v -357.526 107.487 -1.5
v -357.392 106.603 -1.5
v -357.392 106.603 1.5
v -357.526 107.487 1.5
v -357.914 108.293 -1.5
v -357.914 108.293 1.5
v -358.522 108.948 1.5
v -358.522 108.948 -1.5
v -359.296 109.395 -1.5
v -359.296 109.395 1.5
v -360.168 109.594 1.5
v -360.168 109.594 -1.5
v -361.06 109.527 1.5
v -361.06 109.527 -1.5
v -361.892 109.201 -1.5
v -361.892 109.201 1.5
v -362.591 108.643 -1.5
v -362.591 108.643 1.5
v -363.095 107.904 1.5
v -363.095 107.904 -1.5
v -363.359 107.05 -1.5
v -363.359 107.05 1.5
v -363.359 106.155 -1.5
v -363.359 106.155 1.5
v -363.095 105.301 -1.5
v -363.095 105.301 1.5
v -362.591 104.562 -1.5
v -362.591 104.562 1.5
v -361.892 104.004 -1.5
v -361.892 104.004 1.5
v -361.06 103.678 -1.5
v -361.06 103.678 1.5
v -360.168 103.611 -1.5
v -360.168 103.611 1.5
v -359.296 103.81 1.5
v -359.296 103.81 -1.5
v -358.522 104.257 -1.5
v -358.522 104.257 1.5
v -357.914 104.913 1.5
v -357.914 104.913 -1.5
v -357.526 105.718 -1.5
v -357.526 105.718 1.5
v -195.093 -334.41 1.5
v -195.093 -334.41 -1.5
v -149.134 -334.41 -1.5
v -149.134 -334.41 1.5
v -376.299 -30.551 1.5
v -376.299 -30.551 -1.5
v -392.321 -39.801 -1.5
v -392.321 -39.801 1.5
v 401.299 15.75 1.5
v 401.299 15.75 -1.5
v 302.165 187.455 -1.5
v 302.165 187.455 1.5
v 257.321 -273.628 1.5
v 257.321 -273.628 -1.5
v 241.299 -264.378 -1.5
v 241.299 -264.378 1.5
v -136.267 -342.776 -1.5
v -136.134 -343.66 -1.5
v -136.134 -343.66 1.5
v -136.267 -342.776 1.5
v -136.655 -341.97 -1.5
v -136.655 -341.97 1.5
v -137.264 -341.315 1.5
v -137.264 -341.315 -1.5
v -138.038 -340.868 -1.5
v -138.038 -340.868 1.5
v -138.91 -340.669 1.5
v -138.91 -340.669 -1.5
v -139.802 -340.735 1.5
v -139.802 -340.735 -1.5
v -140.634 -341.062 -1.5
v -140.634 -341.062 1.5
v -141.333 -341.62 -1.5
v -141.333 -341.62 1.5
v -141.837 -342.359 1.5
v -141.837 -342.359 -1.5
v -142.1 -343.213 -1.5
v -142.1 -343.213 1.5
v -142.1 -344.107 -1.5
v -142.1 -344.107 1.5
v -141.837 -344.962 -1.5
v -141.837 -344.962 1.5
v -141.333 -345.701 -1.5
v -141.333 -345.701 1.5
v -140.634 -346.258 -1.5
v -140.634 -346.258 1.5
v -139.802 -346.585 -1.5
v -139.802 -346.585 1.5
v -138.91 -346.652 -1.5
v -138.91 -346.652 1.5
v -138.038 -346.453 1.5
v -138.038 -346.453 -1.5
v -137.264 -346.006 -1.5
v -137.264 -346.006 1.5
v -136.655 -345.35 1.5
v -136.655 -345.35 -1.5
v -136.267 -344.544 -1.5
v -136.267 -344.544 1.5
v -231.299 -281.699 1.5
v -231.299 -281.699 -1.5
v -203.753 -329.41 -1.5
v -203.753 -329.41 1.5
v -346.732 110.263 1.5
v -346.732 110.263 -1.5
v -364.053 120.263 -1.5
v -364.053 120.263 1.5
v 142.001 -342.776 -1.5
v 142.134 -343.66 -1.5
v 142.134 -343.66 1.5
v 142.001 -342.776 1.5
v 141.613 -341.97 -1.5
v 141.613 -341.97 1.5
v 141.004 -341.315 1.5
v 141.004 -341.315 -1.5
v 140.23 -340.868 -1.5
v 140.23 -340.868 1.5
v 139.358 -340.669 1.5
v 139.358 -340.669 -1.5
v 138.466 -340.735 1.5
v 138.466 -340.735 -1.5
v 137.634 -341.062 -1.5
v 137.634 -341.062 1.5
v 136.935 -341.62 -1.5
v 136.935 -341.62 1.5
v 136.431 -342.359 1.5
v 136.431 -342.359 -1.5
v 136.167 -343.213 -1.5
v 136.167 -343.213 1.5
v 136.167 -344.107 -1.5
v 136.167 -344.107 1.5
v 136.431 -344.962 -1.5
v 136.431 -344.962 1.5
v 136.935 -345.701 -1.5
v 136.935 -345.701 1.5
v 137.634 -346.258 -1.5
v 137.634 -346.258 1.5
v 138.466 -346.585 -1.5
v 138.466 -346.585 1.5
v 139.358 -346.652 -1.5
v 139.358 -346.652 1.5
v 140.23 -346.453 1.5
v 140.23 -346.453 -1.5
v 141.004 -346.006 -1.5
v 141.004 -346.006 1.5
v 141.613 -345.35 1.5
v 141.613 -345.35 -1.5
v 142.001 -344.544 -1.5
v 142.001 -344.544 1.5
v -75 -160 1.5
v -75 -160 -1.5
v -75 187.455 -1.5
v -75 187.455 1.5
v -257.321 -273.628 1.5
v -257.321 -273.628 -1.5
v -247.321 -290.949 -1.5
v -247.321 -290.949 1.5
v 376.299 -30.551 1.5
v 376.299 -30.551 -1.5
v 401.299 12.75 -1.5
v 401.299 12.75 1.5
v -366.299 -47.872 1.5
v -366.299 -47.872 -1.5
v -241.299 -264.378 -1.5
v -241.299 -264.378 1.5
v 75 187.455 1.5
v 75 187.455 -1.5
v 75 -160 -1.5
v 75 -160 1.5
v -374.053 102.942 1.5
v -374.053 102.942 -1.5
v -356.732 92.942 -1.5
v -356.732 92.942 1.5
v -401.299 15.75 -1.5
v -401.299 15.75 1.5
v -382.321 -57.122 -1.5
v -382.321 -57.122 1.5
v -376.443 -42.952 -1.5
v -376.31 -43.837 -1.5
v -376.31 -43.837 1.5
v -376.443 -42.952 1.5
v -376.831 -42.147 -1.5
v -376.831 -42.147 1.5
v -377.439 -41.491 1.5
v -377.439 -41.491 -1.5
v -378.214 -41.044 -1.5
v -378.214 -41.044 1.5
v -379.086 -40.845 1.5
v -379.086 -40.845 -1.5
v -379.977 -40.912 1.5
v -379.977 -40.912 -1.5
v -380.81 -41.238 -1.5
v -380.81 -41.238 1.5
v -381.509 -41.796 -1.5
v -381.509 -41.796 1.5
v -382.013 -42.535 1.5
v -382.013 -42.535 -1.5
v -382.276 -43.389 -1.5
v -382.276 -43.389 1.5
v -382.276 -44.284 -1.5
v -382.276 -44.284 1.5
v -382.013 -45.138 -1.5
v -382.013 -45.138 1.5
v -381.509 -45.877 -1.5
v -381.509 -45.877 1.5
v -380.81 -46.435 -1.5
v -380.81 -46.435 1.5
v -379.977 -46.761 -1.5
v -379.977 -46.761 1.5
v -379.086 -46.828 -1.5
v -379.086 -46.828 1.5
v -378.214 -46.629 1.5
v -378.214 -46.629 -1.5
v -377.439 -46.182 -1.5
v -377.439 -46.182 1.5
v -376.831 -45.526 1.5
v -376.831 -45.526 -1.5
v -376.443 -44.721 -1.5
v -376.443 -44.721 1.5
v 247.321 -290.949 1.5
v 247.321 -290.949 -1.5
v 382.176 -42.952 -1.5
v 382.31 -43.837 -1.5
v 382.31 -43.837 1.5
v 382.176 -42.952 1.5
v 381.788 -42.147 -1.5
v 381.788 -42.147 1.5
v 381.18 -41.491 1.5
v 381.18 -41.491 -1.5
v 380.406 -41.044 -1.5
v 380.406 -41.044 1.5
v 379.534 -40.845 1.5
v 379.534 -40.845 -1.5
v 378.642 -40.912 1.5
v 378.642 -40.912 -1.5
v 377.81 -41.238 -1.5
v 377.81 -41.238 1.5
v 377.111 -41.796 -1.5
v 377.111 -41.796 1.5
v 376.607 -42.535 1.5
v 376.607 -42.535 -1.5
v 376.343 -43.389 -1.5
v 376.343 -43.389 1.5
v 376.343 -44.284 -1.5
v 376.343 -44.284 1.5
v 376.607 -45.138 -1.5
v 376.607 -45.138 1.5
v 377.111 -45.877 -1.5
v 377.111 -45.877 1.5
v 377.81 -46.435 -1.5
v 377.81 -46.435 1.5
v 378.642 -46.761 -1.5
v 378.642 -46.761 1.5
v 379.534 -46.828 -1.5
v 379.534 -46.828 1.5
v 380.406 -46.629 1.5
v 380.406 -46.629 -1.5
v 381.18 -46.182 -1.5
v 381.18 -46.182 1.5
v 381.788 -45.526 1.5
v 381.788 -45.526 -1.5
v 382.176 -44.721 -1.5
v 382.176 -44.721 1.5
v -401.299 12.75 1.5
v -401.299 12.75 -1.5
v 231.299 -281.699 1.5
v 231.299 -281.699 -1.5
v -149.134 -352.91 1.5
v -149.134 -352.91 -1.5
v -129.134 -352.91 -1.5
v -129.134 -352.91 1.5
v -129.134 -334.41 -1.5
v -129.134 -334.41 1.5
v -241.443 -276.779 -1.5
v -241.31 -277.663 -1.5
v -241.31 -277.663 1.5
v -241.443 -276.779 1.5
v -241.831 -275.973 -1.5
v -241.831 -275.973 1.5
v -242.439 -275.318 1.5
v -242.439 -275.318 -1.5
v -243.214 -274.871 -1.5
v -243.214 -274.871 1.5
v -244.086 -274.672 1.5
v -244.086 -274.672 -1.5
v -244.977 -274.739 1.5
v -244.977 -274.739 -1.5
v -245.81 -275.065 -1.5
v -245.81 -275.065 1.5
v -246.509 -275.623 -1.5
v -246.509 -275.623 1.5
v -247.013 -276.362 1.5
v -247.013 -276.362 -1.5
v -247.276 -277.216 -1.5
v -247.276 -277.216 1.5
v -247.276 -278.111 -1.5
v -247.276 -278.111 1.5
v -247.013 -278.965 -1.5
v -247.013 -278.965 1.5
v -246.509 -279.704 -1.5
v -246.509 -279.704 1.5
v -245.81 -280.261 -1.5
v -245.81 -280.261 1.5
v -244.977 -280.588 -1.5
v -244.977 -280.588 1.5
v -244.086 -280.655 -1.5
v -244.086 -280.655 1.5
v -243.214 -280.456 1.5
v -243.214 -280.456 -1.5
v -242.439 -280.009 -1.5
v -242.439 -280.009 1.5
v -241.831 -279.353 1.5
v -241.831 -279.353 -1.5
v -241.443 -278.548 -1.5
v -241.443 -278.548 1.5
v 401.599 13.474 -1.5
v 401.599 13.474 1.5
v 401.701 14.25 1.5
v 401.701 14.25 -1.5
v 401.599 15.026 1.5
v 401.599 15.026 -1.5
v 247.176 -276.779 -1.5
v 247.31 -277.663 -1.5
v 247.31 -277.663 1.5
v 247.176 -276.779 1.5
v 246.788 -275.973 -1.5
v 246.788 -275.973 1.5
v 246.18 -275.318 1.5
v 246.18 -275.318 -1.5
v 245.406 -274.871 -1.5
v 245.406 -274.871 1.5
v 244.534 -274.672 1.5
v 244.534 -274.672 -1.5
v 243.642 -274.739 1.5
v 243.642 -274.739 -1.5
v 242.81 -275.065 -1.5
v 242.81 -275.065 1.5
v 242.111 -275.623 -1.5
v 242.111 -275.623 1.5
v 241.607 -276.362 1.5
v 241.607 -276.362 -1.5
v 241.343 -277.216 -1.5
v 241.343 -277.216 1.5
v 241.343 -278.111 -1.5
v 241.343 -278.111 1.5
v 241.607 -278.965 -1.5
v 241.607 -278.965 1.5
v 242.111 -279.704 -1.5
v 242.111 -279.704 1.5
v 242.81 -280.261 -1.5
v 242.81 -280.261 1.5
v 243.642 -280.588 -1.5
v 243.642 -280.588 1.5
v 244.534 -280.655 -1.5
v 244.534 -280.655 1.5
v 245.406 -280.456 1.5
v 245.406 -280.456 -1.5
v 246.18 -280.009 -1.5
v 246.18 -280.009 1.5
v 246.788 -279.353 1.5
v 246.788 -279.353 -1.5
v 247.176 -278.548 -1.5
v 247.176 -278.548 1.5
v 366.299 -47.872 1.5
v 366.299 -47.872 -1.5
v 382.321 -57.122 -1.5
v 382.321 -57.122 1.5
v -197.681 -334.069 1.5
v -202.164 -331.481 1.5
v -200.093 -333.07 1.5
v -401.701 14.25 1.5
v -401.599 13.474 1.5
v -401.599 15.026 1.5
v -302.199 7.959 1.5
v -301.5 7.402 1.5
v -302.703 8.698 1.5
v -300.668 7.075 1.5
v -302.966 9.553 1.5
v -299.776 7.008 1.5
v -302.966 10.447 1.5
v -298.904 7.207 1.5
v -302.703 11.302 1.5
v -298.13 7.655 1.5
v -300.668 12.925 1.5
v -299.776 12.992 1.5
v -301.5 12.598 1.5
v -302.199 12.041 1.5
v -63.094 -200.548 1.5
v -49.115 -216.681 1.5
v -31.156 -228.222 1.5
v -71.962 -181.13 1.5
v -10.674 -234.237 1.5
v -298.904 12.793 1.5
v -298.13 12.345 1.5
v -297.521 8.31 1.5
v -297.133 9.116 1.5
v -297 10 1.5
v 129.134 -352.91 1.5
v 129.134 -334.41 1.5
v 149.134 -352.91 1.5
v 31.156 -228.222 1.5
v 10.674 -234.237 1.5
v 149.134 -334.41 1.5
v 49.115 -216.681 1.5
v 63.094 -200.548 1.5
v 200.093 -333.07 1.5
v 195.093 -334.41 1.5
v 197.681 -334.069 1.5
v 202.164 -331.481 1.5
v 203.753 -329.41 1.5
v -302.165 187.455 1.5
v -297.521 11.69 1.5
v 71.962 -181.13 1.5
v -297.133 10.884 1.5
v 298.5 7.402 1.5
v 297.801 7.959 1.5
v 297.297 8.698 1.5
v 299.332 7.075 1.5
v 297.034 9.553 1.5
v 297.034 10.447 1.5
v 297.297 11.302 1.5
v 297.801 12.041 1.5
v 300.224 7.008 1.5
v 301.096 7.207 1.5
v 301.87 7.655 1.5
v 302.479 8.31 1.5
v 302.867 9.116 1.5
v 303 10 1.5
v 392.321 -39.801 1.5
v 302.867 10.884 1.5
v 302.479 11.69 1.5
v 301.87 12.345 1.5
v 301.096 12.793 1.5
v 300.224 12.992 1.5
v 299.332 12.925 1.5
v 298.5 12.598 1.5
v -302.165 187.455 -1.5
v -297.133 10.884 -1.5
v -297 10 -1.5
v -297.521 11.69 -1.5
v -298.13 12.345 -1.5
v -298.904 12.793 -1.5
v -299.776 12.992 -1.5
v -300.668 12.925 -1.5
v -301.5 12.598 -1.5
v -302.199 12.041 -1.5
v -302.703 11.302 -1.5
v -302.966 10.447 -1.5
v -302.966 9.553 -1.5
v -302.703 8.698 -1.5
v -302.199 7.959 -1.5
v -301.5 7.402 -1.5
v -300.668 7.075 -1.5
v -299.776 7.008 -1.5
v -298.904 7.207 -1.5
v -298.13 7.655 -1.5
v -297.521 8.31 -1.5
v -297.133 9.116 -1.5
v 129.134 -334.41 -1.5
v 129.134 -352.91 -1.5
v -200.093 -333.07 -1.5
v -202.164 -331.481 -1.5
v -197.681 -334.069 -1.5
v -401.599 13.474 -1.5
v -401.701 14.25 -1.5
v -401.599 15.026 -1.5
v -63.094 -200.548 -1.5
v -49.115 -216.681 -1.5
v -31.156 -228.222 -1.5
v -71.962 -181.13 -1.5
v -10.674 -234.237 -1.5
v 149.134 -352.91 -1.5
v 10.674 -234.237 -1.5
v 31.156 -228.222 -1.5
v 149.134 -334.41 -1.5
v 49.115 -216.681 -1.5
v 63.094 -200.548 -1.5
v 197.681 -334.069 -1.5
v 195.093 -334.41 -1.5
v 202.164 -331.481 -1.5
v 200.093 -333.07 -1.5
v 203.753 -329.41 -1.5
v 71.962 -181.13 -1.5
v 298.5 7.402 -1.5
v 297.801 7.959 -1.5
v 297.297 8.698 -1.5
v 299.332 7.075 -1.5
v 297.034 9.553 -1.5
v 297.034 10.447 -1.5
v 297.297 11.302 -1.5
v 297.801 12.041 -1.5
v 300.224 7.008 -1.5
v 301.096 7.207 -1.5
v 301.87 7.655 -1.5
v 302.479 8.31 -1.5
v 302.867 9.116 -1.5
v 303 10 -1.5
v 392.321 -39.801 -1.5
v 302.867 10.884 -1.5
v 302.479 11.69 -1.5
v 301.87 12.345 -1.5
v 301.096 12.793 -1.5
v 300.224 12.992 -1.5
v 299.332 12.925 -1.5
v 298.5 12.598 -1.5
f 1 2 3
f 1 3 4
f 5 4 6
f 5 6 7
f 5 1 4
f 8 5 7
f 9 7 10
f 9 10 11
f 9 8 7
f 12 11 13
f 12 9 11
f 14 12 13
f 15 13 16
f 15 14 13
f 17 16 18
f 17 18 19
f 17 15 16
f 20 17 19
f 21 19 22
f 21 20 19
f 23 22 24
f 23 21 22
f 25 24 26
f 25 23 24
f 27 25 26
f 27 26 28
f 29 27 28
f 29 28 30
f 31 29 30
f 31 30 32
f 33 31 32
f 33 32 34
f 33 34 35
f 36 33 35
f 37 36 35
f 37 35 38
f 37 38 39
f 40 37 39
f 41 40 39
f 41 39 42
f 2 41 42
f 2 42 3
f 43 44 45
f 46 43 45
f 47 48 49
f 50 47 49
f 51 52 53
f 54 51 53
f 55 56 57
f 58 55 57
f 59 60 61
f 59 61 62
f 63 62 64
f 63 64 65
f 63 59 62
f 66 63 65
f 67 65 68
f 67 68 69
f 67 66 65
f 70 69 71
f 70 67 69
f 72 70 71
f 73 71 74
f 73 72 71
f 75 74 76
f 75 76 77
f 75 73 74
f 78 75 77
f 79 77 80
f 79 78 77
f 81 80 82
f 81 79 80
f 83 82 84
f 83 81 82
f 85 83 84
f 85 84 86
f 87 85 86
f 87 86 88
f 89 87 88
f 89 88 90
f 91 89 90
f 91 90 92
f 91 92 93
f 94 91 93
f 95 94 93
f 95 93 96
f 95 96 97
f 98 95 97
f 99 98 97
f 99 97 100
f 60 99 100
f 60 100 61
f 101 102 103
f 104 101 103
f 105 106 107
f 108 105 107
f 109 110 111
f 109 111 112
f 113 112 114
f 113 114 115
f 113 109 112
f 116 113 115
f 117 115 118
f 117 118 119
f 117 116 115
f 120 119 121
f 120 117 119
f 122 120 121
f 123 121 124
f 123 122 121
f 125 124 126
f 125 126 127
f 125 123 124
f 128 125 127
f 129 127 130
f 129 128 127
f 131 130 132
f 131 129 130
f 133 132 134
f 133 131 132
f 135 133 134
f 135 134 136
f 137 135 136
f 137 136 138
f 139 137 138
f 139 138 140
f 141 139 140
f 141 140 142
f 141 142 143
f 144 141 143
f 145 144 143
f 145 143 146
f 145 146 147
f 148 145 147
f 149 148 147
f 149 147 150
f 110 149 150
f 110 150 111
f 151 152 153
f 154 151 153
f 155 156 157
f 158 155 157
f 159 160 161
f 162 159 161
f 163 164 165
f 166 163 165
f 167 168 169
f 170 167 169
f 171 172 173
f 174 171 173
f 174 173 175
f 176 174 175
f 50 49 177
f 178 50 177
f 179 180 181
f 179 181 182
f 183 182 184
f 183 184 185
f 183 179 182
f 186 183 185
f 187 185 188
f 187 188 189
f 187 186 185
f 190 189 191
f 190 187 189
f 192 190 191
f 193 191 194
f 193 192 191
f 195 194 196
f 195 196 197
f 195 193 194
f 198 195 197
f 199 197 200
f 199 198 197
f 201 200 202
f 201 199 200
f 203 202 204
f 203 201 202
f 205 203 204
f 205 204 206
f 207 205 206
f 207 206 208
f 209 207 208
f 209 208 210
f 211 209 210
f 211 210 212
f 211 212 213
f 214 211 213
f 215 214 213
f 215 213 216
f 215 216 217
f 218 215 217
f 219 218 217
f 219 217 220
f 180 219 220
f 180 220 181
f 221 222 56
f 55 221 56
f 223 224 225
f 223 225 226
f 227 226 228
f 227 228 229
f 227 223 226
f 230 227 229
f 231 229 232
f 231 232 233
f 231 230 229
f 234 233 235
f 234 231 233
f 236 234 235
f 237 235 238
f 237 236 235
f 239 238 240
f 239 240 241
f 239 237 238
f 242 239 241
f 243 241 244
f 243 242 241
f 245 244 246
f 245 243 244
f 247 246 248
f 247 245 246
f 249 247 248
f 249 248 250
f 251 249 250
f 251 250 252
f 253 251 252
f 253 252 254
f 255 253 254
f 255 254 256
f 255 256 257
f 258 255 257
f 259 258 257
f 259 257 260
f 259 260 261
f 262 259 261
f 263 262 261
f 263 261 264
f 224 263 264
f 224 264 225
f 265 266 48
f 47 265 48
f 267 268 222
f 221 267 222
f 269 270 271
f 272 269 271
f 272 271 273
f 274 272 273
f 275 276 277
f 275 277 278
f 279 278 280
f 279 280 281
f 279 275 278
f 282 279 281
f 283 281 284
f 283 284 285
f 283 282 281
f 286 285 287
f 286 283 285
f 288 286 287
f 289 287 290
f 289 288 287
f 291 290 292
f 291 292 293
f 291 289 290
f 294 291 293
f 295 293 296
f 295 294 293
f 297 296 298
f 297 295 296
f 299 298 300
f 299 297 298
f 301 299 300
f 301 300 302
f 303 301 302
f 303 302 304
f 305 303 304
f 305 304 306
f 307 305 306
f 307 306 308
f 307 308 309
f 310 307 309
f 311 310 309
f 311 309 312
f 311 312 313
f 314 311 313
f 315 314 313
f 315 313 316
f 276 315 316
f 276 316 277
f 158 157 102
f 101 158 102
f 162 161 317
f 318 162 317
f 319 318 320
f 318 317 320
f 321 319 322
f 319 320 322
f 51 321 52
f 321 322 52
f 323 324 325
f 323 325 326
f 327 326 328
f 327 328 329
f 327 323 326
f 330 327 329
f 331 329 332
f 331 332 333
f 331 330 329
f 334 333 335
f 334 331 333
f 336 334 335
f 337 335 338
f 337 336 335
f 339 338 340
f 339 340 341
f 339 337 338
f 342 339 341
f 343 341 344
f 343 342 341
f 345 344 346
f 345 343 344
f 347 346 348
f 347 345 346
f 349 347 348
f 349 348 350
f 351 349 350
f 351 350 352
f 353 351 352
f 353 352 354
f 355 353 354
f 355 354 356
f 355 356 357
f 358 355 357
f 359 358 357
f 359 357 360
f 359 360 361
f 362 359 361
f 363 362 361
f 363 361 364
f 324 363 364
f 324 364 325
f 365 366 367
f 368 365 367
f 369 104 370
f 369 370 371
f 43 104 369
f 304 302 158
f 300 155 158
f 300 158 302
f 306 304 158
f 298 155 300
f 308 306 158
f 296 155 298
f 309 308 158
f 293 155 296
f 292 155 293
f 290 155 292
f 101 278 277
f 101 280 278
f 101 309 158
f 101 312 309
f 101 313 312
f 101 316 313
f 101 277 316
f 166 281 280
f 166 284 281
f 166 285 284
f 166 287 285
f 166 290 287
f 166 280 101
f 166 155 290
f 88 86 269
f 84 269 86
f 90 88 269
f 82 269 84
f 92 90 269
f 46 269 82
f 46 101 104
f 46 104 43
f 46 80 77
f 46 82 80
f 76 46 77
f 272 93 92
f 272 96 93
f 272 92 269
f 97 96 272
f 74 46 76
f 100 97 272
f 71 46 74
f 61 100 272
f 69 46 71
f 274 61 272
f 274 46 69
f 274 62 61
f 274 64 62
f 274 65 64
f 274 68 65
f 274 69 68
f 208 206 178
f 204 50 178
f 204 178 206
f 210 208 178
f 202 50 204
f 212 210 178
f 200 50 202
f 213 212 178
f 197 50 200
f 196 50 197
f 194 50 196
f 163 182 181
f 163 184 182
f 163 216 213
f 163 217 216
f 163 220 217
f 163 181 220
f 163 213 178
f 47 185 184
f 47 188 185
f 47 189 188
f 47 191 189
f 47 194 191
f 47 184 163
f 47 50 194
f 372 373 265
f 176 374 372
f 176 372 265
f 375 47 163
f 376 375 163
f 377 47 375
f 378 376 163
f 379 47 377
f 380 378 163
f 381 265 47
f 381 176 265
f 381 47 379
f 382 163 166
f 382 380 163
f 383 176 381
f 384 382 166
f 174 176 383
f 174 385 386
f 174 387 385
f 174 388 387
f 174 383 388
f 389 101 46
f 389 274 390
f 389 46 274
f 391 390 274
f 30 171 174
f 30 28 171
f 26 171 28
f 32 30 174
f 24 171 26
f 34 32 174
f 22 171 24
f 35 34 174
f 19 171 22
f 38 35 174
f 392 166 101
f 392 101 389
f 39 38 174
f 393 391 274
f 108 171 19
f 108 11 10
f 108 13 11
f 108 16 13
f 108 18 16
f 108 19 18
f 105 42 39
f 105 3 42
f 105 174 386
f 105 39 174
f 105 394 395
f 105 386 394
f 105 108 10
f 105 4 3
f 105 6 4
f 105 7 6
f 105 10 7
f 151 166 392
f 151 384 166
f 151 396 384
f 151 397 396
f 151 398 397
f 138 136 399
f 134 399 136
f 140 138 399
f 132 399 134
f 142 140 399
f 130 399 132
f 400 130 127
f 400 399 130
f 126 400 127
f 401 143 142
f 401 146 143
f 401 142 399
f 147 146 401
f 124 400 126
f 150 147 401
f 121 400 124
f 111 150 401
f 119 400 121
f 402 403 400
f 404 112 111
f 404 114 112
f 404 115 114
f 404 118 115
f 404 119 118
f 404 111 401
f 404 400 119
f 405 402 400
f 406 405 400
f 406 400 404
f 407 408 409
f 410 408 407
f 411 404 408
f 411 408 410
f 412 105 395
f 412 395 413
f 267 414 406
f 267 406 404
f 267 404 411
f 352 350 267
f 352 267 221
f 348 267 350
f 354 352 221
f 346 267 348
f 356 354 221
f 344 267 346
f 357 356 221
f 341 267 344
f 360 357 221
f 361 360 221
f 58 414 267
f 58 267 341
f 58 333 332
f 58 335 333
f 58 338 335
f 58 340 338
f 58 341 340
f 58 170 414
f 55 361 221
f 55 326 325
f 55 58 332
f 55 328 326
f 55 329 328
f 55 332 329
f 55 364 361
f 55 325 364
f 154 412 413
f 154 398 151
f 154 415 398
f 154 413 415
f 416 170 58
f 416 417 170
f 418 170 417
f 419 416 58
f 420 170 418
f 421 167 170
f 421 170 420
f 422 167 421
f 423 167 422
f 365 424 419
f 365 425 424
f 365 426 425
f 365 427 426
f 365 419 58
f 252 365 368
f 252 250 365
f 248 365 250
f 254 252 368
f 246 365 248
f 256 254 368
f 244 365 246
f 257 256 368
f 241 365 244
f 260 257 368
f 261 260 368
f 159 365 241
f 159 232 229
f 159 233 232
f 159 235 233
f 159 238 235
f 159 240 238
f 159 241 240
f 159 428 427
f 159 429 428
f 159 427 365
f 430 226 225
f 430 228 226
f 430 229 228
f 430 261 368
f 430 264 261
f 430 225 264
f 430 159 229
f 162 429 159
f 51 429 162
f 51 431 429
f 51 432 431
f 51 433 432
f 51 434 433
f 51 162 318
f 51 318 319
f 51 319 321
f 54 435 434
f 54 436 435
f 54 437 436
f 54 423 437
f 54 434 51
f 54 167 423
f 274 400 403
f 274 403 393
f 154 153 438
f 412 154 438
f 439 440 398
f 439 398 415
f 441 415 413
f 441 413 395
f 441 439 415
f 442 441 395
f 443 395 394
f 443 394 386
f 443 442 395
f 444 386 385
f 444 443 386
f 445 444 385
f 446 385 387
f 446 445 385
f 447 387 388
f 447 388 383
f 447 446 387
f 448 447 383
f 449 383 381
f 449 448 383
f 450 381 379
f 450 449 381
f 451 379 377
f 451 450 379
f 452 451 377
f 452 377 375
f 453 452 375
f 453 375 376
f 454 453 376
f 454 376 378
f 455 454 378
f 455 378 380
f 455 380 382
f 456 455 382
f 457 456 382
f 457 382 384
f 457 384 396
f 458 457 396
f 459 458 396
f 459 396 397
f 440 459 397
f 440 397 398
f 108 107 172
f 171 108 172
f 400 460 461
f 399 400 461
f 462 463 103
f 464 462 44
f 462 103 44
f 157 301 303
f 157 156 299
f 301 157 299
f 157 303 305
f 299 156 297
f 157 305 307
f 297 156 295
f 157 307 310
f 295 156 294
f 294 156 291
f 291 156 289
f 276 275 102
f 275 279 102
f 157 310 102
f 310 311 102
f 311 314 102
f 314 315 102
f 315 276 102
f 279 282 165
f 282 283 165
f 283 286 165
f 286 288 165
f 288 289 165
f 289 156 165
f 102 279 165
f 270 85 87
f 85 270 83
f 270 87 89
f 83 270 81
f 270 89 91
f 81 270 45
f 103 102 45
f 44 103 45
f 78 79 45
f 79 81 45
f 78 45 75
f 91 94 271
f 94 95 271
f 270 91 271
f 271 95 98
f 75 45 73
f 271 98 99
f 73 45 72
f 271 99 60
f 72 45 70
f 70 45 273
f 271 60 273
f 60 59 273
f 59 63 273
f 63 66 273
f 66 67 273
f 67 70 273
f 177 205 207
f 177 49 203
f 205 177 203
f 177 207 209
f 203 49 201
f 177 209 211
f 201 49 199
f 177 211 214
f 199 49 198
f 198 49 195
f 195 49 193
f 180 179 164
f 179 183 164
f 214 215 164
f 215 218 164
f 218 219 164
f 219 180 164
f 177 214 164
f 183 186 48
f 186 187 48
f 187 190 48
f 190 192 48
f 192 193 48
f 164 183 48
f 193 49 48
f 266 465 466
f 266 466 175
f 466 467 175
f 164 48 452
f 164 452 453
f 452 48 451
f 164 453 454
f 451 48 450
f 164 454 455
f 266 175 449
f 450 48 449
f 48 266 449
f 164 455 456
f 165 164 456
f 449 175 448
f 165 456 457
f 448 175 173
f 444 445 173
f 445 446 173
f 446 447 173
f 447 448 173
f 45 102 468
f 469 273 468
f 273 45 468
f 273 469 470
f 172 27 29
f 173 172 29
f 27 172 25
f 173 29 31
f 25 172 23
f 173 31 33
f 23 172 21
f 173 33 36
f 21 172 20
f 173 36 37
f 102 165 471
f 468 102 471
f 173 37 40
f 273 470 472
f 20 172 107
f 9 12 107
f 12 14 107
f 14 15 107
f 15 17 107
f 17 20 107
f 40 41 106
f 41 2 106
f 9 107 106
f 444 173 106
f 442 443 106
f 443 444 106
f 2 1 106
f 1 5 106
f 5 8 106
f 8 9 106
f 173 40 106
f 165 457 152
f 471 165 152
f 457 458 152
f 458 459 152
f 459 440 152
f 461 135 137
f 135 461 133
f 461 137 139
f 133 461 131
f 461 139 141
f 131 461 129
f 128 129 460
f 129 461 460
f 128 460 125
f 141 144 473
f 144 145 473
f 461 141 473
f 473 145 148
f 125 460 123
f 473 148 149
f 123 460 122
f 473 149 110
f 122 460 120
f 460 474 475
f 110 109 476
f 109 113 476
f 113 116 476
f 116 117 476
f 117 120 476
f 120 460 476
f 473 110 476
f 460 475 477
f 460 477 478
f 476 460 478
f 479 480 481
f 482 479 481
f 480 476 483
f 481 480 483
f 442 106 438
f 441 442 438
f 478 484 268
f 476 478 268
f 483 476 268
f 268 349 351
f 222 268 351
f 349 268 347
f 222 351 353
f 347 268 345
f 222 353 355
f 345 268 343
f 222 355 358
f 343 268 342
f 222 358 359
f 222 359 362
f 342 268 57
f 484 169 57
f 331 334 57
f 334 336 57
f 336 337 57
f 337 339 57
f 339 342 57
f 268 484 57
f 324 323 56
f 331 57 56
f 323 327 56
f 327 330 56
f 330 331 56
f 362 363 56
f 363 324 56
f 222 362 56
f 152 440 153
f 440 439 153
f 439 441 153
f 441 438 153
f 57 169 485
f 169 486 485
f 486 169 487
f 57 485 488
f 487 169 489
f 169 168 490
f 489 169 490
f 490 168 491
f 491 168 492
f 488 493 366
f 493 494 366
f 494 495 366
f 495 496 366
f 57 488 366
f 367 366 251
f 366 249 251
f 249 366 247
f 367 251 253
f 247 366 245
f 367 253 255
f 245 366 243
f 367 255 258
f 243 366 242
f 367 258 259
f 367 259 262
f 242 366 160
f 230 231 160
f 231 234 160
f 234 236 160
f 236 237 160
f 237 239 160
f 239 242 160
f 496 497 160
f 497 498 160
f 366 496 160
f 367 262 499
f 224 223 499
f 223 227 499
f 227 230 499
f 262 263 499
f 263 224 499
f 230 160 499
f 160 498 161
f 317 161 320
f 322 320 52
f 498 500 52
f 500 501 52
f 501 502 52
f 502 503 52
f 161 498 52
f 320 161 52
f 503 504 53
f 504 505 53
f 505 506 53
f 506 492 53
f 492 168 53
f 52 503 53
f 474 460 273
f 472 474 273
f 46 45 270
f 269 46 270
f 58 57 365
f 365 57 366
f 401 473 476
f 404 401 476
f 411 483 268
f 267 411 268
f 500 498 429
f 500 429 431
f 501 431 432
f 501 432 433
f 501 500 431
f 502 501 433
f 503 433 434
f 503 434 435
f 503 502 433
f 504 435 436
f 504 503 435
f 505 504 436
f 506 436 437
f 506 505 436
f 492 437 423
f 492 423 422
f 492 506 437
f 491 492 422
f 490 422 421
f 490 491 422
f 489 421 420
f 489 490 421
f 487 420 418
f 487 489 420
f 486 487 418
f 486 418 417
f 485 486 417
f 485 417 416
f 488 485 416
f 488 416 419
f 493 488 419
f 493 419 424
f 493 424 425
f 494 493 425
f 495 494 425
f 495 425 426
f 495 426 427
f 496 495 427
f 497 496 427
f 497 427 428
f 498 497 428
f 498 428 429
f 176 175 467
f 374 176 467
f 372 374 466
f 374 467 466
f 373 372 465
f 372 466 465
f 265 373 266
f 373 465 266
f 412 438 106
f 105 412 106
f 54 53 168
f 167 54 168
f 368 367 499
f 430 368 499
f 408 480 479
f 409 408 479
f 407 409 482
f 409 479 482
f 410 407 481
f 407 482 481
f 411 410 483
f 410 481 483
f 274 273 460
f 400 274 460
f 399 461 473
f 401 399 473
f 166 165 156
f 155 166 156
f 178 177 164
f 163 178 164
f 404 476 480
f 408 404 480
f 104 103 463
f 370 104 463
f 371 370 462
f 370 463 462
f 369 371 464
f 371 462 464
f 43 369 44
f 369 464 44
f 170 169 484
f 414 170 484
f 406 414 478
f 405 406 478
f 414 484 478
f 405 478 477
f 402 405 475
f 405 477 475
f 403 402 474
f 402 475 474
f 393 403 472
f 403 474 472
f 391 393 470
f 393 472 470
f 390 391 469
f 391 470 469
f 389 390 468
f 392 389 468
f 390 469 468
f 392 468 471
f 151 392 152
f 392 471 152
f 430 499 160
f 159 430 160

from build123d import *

# Parameters (mm, degrees)
SKETCH_1_R              = 3
EXTRUDE_1_DEPTH         = 1.5
SHEET_START             = -1.5
SHEET_METAL_1_OUTLINE_R = 3
SHEET_METAL_1_DEPTH     = 1.5


# Read off the part's stored shape, not the designer's step: Преобразовать-Твердое тело1
with BuildPart() as part:
    # Sketch 1 → Бобышка-Вытянуть1 (new body)
    with BuildSketch(Plane.XY):
        with BuildLine():
            Line((-75, -160), (-75, 187.455080757))
            Line((-75, 187.455080757), (-302.165063509, 187.455080757))
            Line((-302.165063509, 187.455080757), (-346.732050808, 110.262794416))
            Line((-346.732050808, 110.262794416), (-364.052558883, 120.262794416))
            Line((-364.052558883, 120.262794416), (-374.052558883, 102.942286341))
            Line((-374.052558883, 102.942286341), (-356.732050808, 92.942286341))
            Line((-356.732050808, 92.942286341), (-401.299038106, 15.75))
            ThreePointArc((-401.299038106, 15.75), (-401.700961894, 14.25), (-401.299038106, 12.75))
            Line((-401.299038106, 12.75), (-376.299038106, -30.551270189))
            Line((-376.299038106, -30.551270189), (-392.320508076, -39.801270189))
            Line((-392.320508076, -39.801270189), (-382.320508076, -57.121778265))
            Line((-382.320508076, -57.121778265), (-366.299038106, -47.871778265))
            Line((-366.299038106, -47.871778265), (-241.299038106, -264.378129211))
            Line((-241.299038106, -264.378129211), (-257.320508076, -273.628129211))
            Line((-257.320508076, -273.628129211), (-247.320508076, -290.948637287))
            Line((-247.320508076, -290.948637287), (-231.299038106, -281.698637287))
            Line((-231.299038106, -281.698637287), (-203.75277675, -329.410161514))
            ThreePointArc((-203.75277675, -329.410161514), (-200.092522712, -333.070415552), (-195.092522712, -334.410161514))
            Line((-195.092522712, -334.410161514), (-149.133974596, -334.410161514))
            Line((-149.133974596, -334.410161514), (-149.133974596, -352.910161514))
            Line((-149.133974596, -352.910161514), (-129.133974596, -352.910161514))
            Line((-129.133974596, -352.910161514), (-129.133974596, -334.410161514))
            Line((-129.133974596, -334.410161514), (129.133974596, -334.410161514))
            Line((129.133974596, -334.410161514), (129.133974596, -352.910161514))
            Line((129.133974596, -352.910161514), (149.133974596, -352.910161514))
            Line((149.133974596, -352.910161514), (149.133974596, -334.410161514))
            Line((149.133974596, -334.410161514), (195.092522712, -334.410161514))
            ThreePointArc((195.092522712, -334.410161514), (200.092522712, -333.070415552), (203.75277675, -329.410161514))
            Line((203.75277675, -329.410161514), (231.299038106, -281.698637287))
            Line((231.299038106, -281.698637287), (247.320508076, -290.948637287))
            Line((247.320508076, -290.948637287), (257.320508076, -273.628129211))
            Line((257.320508076, -273.628129211), (241.299038106, -264.378129211))
            Line((241.299038106, -264.378129211), (366.299038106, -47.871778265))
            Line((366.299038106, -47.871778265), (382.320508076, -57.121778265))
            Line((382.320508076, -57.121778265), (392.320508076, -39.801270189))
            Line((392.320508076, -39.801270189), (376.299038106, -30.551270189))
            Line((376.299038106, -30.551270189), (401.299038106, 12.75))
            ThreePointArc((401.299038106, 12.75), (401.700961894, 14.25), (401.299038106, 15.75))
            Line((401.299038106, 15.75), (302.165063509, 187.455080757))
            Line((302.165063509, 187.455080757), (75, 187.455080757))
            Line((75, 187.455080757), (75, -160))
            ThreePointArc((75, -160), (0, -235), (-75, -160))
        make_face()
        with Locations((244.309773091, -277.663383249)):
            Circle(SKETCH_1_R, mode=Mode.SUBTRACT)
        with Locations((139.133974596, -343.660161514)):
            Circle(SKETCH_1_R, mode=Mode.SUBTRACT)
        with Locations((-139.133974596, -343.660161514)):
            Circle(SKETCH_1_R, mode=Mode.SUBTRACT)
        with Locations((-244.309773091, -277.663383249)):
            Circle(SKETCH_1_R, mode=Mode.SUBTRACT)
        with Locations((300, 10)):
            Circle(SKETCH_1_R, mode=Mode.SUBTRACT)
        with Locations((-300, 10)):
            Circle(SKETCH_1_R, mode=Mode.SUBTRACT)
        with Locations((-379.309773091, -43.836524227)):
            Circle(SKETCH_1_R, mode=Mode.SUBTRACT)
        with Locations((379.309773091, -43.836524227)):
            Circle(SKETCH_1_R, mode=Mode.SUBTRACT)
        with Locations((-360.392304845, 106.602540378)):
            Circle(SKETCH_1_R, mode=Mode.SUBTRACT)
    extrude(amount=EXTRUDE_1_DEPTH)

    # Sheet Metal 1 outline → Sheet Metal 1 (add)
    with BuildSketch(Plane.XY.offset(SHEET_START)):
        with BuildLine():
            Line((-149.133974596, -334.410161514), (-149.133974596, -352.910161514))
            Line((-149.133974596, -352.910161514), (-129.133974596, -352.910161514))
            Line((-129.133974596, -352.910161514), (-129.133974596, -334.410161514))
            Line((-129.133974596, -334.410161514), (129.133974596, -334.410161514))
            Line((129.133974596, -334.410161514), (129.133974596, -352.910161514))
            Line((129.133974596, -352.910161514), (149.133974596, -352.910161514))
            Line((149.133974596, -352.910161514), (149.133974596, -334.410161514))
            Line((149.133974596, -334.410161514), (195.092522712, -334.410161514))
            ThreePointArc((195.092522712, -334.410161514), (200.092522712, -333.070415552), (203.75277675, -329.410161514))
            Line((203.75277675, -329.410161514), (231.299038106, -281.698637287))
            Line((231.299038106, -281.698637287), (247.320508076, -290.948637287))
            Line((247.320508076, -290.948637287), (257.320508076, -273.628129211))
            Line((257.320508076, -273.628129211), (241.299038106, -264.378129211))
            Line((241.299038106, -264.378129211), (366.299038106, -47.871778265))
            Line((366.299038106, -47.871778265), (382.320508076, -57.121778265))
            Line((382.320508076, -57.121778265), (392.320508076, -39.801270189))
            Line((392.320508076, -39.801270189), (376.299038106, -30.551270189))
            Line((376.299038106, -30.551270189), (401.299038106, 12.75))
            ThreePointArc((401.299038106, 12.75), (401.700961894, 14.25), (401.299038106, 15.75))
            Line((401.299038106, 15.75), (302.165063509, 187.455080757))
            Line((302.165063509, 187.455080757), (75, 187.455080757))
            Line((75, 187.455080757), (75, -160))
            ThreePointArc((75, -160), (0, -235), (-75, -160))
            Line((-75, -160), (-75, 187.455080757))
            Line((-75, 187.455080757), (-302.165063509, 187.455080757))
            Line((-302.165063509, 187.455080757), (-346.732050808, 110.262794416))
            Line((-346.732050808, 110.262794416), (-364.052558883, 120.262794416))
            Line((-364.052558883, 120.262794416), (-374.052558883, 102.942286341))
            Line((-374.052558883, 102.942286341), (-356.732050808, 92.942286341))
            Line((-356.732050808, 92.942286341), (-401.299038106, 15.75))
            ThreePointArc((-401.299038106, 15.75), (-401.700961894, 14.25), (-401.299038106, 12.75))
            Line((-401.299038106, 12.75), (-376.299038106, -30.551270189))
            Line((-376.299038106, -30.551270189), (-392.320508076, -39.801270189))
            Line((-392.320508076, -39.801270189), (-382.320508076, -57.121778265))
            Line((-382.320508076, -57.121778265), (-366.299038106, -47.871778265))
            Line((-366.299038106, -47.871778265), (-241.299038106, -264.378129211))
            Line((-241.299038106, -264.378129211), (-257.320508076, -273.628129211))
            Line((-257.320508076, -273.628129211), (-247.320508076, -290.948637287))
            Line((-247.320508076, -290.948637287), (-231.299038106, -281.698637287))
            Line((-231.299038106, -281.698637287), (-203.75277675, -329.410161514))
            ThreePointArc((-203.75277675, -329.410161514), (-200.092522712, -333.070415552), (-195.092522712, -334.410161514))
            Line((-195.092522712, -334.410161514), (-149.133974596, -334.410161514))
        make_face()
        with Locations((-244.309773091, -277.663383249)):
            Circle(SHEET_METAL_1_OUTLINE_R, mode=Mode.SUBTRACT)
        with Locations((-139.133974596, -343.660161514)):
            Circle(SHEET_METAL_1_OUTLINE_R, mode=Mode.SUBTRACT)
        with Locations((139.133974596, -343.660161514)):
            Circle(SHEET_METAL_1_OUTLINE_R, mode=Mode.SUBTRACT)
        with Locations((244.309773091, -277.663383249)):
            Circle(SHEET_METAL_1_OUTLINE_R, mode=Mode.SUBTRACT)
        with Locations((-379.309773091, -43.836524227)):
            Circle(SHEET_METAL_1_OUTLINE_R, mode=Mode.SUBTRACT)
        with Locations((-300, 10)):
            Circle(SHEET_METAL_1_OUTLINE_R, mode=Mode.SUBTRACT)
        with Locations((-360.392304845, 106.602540378)):
            Circle(SHEET_METAL_1_OUTLINE_R, mode=Mode.SUBTRACT)
        with Locations((379.309773091, -43.836524227)):
            Circle(SHEET_METAL_1_OUTLINE_R, mode=Mode.SUBTRACT)
        with Locations((300, 10)):
            Circle(SHEET_METAL_1_OUTLINE_R, mode=Mode.SUBTRACT)
    extrude(amount=SHEET_METAL_1_DEPTH)


solid = part.part
